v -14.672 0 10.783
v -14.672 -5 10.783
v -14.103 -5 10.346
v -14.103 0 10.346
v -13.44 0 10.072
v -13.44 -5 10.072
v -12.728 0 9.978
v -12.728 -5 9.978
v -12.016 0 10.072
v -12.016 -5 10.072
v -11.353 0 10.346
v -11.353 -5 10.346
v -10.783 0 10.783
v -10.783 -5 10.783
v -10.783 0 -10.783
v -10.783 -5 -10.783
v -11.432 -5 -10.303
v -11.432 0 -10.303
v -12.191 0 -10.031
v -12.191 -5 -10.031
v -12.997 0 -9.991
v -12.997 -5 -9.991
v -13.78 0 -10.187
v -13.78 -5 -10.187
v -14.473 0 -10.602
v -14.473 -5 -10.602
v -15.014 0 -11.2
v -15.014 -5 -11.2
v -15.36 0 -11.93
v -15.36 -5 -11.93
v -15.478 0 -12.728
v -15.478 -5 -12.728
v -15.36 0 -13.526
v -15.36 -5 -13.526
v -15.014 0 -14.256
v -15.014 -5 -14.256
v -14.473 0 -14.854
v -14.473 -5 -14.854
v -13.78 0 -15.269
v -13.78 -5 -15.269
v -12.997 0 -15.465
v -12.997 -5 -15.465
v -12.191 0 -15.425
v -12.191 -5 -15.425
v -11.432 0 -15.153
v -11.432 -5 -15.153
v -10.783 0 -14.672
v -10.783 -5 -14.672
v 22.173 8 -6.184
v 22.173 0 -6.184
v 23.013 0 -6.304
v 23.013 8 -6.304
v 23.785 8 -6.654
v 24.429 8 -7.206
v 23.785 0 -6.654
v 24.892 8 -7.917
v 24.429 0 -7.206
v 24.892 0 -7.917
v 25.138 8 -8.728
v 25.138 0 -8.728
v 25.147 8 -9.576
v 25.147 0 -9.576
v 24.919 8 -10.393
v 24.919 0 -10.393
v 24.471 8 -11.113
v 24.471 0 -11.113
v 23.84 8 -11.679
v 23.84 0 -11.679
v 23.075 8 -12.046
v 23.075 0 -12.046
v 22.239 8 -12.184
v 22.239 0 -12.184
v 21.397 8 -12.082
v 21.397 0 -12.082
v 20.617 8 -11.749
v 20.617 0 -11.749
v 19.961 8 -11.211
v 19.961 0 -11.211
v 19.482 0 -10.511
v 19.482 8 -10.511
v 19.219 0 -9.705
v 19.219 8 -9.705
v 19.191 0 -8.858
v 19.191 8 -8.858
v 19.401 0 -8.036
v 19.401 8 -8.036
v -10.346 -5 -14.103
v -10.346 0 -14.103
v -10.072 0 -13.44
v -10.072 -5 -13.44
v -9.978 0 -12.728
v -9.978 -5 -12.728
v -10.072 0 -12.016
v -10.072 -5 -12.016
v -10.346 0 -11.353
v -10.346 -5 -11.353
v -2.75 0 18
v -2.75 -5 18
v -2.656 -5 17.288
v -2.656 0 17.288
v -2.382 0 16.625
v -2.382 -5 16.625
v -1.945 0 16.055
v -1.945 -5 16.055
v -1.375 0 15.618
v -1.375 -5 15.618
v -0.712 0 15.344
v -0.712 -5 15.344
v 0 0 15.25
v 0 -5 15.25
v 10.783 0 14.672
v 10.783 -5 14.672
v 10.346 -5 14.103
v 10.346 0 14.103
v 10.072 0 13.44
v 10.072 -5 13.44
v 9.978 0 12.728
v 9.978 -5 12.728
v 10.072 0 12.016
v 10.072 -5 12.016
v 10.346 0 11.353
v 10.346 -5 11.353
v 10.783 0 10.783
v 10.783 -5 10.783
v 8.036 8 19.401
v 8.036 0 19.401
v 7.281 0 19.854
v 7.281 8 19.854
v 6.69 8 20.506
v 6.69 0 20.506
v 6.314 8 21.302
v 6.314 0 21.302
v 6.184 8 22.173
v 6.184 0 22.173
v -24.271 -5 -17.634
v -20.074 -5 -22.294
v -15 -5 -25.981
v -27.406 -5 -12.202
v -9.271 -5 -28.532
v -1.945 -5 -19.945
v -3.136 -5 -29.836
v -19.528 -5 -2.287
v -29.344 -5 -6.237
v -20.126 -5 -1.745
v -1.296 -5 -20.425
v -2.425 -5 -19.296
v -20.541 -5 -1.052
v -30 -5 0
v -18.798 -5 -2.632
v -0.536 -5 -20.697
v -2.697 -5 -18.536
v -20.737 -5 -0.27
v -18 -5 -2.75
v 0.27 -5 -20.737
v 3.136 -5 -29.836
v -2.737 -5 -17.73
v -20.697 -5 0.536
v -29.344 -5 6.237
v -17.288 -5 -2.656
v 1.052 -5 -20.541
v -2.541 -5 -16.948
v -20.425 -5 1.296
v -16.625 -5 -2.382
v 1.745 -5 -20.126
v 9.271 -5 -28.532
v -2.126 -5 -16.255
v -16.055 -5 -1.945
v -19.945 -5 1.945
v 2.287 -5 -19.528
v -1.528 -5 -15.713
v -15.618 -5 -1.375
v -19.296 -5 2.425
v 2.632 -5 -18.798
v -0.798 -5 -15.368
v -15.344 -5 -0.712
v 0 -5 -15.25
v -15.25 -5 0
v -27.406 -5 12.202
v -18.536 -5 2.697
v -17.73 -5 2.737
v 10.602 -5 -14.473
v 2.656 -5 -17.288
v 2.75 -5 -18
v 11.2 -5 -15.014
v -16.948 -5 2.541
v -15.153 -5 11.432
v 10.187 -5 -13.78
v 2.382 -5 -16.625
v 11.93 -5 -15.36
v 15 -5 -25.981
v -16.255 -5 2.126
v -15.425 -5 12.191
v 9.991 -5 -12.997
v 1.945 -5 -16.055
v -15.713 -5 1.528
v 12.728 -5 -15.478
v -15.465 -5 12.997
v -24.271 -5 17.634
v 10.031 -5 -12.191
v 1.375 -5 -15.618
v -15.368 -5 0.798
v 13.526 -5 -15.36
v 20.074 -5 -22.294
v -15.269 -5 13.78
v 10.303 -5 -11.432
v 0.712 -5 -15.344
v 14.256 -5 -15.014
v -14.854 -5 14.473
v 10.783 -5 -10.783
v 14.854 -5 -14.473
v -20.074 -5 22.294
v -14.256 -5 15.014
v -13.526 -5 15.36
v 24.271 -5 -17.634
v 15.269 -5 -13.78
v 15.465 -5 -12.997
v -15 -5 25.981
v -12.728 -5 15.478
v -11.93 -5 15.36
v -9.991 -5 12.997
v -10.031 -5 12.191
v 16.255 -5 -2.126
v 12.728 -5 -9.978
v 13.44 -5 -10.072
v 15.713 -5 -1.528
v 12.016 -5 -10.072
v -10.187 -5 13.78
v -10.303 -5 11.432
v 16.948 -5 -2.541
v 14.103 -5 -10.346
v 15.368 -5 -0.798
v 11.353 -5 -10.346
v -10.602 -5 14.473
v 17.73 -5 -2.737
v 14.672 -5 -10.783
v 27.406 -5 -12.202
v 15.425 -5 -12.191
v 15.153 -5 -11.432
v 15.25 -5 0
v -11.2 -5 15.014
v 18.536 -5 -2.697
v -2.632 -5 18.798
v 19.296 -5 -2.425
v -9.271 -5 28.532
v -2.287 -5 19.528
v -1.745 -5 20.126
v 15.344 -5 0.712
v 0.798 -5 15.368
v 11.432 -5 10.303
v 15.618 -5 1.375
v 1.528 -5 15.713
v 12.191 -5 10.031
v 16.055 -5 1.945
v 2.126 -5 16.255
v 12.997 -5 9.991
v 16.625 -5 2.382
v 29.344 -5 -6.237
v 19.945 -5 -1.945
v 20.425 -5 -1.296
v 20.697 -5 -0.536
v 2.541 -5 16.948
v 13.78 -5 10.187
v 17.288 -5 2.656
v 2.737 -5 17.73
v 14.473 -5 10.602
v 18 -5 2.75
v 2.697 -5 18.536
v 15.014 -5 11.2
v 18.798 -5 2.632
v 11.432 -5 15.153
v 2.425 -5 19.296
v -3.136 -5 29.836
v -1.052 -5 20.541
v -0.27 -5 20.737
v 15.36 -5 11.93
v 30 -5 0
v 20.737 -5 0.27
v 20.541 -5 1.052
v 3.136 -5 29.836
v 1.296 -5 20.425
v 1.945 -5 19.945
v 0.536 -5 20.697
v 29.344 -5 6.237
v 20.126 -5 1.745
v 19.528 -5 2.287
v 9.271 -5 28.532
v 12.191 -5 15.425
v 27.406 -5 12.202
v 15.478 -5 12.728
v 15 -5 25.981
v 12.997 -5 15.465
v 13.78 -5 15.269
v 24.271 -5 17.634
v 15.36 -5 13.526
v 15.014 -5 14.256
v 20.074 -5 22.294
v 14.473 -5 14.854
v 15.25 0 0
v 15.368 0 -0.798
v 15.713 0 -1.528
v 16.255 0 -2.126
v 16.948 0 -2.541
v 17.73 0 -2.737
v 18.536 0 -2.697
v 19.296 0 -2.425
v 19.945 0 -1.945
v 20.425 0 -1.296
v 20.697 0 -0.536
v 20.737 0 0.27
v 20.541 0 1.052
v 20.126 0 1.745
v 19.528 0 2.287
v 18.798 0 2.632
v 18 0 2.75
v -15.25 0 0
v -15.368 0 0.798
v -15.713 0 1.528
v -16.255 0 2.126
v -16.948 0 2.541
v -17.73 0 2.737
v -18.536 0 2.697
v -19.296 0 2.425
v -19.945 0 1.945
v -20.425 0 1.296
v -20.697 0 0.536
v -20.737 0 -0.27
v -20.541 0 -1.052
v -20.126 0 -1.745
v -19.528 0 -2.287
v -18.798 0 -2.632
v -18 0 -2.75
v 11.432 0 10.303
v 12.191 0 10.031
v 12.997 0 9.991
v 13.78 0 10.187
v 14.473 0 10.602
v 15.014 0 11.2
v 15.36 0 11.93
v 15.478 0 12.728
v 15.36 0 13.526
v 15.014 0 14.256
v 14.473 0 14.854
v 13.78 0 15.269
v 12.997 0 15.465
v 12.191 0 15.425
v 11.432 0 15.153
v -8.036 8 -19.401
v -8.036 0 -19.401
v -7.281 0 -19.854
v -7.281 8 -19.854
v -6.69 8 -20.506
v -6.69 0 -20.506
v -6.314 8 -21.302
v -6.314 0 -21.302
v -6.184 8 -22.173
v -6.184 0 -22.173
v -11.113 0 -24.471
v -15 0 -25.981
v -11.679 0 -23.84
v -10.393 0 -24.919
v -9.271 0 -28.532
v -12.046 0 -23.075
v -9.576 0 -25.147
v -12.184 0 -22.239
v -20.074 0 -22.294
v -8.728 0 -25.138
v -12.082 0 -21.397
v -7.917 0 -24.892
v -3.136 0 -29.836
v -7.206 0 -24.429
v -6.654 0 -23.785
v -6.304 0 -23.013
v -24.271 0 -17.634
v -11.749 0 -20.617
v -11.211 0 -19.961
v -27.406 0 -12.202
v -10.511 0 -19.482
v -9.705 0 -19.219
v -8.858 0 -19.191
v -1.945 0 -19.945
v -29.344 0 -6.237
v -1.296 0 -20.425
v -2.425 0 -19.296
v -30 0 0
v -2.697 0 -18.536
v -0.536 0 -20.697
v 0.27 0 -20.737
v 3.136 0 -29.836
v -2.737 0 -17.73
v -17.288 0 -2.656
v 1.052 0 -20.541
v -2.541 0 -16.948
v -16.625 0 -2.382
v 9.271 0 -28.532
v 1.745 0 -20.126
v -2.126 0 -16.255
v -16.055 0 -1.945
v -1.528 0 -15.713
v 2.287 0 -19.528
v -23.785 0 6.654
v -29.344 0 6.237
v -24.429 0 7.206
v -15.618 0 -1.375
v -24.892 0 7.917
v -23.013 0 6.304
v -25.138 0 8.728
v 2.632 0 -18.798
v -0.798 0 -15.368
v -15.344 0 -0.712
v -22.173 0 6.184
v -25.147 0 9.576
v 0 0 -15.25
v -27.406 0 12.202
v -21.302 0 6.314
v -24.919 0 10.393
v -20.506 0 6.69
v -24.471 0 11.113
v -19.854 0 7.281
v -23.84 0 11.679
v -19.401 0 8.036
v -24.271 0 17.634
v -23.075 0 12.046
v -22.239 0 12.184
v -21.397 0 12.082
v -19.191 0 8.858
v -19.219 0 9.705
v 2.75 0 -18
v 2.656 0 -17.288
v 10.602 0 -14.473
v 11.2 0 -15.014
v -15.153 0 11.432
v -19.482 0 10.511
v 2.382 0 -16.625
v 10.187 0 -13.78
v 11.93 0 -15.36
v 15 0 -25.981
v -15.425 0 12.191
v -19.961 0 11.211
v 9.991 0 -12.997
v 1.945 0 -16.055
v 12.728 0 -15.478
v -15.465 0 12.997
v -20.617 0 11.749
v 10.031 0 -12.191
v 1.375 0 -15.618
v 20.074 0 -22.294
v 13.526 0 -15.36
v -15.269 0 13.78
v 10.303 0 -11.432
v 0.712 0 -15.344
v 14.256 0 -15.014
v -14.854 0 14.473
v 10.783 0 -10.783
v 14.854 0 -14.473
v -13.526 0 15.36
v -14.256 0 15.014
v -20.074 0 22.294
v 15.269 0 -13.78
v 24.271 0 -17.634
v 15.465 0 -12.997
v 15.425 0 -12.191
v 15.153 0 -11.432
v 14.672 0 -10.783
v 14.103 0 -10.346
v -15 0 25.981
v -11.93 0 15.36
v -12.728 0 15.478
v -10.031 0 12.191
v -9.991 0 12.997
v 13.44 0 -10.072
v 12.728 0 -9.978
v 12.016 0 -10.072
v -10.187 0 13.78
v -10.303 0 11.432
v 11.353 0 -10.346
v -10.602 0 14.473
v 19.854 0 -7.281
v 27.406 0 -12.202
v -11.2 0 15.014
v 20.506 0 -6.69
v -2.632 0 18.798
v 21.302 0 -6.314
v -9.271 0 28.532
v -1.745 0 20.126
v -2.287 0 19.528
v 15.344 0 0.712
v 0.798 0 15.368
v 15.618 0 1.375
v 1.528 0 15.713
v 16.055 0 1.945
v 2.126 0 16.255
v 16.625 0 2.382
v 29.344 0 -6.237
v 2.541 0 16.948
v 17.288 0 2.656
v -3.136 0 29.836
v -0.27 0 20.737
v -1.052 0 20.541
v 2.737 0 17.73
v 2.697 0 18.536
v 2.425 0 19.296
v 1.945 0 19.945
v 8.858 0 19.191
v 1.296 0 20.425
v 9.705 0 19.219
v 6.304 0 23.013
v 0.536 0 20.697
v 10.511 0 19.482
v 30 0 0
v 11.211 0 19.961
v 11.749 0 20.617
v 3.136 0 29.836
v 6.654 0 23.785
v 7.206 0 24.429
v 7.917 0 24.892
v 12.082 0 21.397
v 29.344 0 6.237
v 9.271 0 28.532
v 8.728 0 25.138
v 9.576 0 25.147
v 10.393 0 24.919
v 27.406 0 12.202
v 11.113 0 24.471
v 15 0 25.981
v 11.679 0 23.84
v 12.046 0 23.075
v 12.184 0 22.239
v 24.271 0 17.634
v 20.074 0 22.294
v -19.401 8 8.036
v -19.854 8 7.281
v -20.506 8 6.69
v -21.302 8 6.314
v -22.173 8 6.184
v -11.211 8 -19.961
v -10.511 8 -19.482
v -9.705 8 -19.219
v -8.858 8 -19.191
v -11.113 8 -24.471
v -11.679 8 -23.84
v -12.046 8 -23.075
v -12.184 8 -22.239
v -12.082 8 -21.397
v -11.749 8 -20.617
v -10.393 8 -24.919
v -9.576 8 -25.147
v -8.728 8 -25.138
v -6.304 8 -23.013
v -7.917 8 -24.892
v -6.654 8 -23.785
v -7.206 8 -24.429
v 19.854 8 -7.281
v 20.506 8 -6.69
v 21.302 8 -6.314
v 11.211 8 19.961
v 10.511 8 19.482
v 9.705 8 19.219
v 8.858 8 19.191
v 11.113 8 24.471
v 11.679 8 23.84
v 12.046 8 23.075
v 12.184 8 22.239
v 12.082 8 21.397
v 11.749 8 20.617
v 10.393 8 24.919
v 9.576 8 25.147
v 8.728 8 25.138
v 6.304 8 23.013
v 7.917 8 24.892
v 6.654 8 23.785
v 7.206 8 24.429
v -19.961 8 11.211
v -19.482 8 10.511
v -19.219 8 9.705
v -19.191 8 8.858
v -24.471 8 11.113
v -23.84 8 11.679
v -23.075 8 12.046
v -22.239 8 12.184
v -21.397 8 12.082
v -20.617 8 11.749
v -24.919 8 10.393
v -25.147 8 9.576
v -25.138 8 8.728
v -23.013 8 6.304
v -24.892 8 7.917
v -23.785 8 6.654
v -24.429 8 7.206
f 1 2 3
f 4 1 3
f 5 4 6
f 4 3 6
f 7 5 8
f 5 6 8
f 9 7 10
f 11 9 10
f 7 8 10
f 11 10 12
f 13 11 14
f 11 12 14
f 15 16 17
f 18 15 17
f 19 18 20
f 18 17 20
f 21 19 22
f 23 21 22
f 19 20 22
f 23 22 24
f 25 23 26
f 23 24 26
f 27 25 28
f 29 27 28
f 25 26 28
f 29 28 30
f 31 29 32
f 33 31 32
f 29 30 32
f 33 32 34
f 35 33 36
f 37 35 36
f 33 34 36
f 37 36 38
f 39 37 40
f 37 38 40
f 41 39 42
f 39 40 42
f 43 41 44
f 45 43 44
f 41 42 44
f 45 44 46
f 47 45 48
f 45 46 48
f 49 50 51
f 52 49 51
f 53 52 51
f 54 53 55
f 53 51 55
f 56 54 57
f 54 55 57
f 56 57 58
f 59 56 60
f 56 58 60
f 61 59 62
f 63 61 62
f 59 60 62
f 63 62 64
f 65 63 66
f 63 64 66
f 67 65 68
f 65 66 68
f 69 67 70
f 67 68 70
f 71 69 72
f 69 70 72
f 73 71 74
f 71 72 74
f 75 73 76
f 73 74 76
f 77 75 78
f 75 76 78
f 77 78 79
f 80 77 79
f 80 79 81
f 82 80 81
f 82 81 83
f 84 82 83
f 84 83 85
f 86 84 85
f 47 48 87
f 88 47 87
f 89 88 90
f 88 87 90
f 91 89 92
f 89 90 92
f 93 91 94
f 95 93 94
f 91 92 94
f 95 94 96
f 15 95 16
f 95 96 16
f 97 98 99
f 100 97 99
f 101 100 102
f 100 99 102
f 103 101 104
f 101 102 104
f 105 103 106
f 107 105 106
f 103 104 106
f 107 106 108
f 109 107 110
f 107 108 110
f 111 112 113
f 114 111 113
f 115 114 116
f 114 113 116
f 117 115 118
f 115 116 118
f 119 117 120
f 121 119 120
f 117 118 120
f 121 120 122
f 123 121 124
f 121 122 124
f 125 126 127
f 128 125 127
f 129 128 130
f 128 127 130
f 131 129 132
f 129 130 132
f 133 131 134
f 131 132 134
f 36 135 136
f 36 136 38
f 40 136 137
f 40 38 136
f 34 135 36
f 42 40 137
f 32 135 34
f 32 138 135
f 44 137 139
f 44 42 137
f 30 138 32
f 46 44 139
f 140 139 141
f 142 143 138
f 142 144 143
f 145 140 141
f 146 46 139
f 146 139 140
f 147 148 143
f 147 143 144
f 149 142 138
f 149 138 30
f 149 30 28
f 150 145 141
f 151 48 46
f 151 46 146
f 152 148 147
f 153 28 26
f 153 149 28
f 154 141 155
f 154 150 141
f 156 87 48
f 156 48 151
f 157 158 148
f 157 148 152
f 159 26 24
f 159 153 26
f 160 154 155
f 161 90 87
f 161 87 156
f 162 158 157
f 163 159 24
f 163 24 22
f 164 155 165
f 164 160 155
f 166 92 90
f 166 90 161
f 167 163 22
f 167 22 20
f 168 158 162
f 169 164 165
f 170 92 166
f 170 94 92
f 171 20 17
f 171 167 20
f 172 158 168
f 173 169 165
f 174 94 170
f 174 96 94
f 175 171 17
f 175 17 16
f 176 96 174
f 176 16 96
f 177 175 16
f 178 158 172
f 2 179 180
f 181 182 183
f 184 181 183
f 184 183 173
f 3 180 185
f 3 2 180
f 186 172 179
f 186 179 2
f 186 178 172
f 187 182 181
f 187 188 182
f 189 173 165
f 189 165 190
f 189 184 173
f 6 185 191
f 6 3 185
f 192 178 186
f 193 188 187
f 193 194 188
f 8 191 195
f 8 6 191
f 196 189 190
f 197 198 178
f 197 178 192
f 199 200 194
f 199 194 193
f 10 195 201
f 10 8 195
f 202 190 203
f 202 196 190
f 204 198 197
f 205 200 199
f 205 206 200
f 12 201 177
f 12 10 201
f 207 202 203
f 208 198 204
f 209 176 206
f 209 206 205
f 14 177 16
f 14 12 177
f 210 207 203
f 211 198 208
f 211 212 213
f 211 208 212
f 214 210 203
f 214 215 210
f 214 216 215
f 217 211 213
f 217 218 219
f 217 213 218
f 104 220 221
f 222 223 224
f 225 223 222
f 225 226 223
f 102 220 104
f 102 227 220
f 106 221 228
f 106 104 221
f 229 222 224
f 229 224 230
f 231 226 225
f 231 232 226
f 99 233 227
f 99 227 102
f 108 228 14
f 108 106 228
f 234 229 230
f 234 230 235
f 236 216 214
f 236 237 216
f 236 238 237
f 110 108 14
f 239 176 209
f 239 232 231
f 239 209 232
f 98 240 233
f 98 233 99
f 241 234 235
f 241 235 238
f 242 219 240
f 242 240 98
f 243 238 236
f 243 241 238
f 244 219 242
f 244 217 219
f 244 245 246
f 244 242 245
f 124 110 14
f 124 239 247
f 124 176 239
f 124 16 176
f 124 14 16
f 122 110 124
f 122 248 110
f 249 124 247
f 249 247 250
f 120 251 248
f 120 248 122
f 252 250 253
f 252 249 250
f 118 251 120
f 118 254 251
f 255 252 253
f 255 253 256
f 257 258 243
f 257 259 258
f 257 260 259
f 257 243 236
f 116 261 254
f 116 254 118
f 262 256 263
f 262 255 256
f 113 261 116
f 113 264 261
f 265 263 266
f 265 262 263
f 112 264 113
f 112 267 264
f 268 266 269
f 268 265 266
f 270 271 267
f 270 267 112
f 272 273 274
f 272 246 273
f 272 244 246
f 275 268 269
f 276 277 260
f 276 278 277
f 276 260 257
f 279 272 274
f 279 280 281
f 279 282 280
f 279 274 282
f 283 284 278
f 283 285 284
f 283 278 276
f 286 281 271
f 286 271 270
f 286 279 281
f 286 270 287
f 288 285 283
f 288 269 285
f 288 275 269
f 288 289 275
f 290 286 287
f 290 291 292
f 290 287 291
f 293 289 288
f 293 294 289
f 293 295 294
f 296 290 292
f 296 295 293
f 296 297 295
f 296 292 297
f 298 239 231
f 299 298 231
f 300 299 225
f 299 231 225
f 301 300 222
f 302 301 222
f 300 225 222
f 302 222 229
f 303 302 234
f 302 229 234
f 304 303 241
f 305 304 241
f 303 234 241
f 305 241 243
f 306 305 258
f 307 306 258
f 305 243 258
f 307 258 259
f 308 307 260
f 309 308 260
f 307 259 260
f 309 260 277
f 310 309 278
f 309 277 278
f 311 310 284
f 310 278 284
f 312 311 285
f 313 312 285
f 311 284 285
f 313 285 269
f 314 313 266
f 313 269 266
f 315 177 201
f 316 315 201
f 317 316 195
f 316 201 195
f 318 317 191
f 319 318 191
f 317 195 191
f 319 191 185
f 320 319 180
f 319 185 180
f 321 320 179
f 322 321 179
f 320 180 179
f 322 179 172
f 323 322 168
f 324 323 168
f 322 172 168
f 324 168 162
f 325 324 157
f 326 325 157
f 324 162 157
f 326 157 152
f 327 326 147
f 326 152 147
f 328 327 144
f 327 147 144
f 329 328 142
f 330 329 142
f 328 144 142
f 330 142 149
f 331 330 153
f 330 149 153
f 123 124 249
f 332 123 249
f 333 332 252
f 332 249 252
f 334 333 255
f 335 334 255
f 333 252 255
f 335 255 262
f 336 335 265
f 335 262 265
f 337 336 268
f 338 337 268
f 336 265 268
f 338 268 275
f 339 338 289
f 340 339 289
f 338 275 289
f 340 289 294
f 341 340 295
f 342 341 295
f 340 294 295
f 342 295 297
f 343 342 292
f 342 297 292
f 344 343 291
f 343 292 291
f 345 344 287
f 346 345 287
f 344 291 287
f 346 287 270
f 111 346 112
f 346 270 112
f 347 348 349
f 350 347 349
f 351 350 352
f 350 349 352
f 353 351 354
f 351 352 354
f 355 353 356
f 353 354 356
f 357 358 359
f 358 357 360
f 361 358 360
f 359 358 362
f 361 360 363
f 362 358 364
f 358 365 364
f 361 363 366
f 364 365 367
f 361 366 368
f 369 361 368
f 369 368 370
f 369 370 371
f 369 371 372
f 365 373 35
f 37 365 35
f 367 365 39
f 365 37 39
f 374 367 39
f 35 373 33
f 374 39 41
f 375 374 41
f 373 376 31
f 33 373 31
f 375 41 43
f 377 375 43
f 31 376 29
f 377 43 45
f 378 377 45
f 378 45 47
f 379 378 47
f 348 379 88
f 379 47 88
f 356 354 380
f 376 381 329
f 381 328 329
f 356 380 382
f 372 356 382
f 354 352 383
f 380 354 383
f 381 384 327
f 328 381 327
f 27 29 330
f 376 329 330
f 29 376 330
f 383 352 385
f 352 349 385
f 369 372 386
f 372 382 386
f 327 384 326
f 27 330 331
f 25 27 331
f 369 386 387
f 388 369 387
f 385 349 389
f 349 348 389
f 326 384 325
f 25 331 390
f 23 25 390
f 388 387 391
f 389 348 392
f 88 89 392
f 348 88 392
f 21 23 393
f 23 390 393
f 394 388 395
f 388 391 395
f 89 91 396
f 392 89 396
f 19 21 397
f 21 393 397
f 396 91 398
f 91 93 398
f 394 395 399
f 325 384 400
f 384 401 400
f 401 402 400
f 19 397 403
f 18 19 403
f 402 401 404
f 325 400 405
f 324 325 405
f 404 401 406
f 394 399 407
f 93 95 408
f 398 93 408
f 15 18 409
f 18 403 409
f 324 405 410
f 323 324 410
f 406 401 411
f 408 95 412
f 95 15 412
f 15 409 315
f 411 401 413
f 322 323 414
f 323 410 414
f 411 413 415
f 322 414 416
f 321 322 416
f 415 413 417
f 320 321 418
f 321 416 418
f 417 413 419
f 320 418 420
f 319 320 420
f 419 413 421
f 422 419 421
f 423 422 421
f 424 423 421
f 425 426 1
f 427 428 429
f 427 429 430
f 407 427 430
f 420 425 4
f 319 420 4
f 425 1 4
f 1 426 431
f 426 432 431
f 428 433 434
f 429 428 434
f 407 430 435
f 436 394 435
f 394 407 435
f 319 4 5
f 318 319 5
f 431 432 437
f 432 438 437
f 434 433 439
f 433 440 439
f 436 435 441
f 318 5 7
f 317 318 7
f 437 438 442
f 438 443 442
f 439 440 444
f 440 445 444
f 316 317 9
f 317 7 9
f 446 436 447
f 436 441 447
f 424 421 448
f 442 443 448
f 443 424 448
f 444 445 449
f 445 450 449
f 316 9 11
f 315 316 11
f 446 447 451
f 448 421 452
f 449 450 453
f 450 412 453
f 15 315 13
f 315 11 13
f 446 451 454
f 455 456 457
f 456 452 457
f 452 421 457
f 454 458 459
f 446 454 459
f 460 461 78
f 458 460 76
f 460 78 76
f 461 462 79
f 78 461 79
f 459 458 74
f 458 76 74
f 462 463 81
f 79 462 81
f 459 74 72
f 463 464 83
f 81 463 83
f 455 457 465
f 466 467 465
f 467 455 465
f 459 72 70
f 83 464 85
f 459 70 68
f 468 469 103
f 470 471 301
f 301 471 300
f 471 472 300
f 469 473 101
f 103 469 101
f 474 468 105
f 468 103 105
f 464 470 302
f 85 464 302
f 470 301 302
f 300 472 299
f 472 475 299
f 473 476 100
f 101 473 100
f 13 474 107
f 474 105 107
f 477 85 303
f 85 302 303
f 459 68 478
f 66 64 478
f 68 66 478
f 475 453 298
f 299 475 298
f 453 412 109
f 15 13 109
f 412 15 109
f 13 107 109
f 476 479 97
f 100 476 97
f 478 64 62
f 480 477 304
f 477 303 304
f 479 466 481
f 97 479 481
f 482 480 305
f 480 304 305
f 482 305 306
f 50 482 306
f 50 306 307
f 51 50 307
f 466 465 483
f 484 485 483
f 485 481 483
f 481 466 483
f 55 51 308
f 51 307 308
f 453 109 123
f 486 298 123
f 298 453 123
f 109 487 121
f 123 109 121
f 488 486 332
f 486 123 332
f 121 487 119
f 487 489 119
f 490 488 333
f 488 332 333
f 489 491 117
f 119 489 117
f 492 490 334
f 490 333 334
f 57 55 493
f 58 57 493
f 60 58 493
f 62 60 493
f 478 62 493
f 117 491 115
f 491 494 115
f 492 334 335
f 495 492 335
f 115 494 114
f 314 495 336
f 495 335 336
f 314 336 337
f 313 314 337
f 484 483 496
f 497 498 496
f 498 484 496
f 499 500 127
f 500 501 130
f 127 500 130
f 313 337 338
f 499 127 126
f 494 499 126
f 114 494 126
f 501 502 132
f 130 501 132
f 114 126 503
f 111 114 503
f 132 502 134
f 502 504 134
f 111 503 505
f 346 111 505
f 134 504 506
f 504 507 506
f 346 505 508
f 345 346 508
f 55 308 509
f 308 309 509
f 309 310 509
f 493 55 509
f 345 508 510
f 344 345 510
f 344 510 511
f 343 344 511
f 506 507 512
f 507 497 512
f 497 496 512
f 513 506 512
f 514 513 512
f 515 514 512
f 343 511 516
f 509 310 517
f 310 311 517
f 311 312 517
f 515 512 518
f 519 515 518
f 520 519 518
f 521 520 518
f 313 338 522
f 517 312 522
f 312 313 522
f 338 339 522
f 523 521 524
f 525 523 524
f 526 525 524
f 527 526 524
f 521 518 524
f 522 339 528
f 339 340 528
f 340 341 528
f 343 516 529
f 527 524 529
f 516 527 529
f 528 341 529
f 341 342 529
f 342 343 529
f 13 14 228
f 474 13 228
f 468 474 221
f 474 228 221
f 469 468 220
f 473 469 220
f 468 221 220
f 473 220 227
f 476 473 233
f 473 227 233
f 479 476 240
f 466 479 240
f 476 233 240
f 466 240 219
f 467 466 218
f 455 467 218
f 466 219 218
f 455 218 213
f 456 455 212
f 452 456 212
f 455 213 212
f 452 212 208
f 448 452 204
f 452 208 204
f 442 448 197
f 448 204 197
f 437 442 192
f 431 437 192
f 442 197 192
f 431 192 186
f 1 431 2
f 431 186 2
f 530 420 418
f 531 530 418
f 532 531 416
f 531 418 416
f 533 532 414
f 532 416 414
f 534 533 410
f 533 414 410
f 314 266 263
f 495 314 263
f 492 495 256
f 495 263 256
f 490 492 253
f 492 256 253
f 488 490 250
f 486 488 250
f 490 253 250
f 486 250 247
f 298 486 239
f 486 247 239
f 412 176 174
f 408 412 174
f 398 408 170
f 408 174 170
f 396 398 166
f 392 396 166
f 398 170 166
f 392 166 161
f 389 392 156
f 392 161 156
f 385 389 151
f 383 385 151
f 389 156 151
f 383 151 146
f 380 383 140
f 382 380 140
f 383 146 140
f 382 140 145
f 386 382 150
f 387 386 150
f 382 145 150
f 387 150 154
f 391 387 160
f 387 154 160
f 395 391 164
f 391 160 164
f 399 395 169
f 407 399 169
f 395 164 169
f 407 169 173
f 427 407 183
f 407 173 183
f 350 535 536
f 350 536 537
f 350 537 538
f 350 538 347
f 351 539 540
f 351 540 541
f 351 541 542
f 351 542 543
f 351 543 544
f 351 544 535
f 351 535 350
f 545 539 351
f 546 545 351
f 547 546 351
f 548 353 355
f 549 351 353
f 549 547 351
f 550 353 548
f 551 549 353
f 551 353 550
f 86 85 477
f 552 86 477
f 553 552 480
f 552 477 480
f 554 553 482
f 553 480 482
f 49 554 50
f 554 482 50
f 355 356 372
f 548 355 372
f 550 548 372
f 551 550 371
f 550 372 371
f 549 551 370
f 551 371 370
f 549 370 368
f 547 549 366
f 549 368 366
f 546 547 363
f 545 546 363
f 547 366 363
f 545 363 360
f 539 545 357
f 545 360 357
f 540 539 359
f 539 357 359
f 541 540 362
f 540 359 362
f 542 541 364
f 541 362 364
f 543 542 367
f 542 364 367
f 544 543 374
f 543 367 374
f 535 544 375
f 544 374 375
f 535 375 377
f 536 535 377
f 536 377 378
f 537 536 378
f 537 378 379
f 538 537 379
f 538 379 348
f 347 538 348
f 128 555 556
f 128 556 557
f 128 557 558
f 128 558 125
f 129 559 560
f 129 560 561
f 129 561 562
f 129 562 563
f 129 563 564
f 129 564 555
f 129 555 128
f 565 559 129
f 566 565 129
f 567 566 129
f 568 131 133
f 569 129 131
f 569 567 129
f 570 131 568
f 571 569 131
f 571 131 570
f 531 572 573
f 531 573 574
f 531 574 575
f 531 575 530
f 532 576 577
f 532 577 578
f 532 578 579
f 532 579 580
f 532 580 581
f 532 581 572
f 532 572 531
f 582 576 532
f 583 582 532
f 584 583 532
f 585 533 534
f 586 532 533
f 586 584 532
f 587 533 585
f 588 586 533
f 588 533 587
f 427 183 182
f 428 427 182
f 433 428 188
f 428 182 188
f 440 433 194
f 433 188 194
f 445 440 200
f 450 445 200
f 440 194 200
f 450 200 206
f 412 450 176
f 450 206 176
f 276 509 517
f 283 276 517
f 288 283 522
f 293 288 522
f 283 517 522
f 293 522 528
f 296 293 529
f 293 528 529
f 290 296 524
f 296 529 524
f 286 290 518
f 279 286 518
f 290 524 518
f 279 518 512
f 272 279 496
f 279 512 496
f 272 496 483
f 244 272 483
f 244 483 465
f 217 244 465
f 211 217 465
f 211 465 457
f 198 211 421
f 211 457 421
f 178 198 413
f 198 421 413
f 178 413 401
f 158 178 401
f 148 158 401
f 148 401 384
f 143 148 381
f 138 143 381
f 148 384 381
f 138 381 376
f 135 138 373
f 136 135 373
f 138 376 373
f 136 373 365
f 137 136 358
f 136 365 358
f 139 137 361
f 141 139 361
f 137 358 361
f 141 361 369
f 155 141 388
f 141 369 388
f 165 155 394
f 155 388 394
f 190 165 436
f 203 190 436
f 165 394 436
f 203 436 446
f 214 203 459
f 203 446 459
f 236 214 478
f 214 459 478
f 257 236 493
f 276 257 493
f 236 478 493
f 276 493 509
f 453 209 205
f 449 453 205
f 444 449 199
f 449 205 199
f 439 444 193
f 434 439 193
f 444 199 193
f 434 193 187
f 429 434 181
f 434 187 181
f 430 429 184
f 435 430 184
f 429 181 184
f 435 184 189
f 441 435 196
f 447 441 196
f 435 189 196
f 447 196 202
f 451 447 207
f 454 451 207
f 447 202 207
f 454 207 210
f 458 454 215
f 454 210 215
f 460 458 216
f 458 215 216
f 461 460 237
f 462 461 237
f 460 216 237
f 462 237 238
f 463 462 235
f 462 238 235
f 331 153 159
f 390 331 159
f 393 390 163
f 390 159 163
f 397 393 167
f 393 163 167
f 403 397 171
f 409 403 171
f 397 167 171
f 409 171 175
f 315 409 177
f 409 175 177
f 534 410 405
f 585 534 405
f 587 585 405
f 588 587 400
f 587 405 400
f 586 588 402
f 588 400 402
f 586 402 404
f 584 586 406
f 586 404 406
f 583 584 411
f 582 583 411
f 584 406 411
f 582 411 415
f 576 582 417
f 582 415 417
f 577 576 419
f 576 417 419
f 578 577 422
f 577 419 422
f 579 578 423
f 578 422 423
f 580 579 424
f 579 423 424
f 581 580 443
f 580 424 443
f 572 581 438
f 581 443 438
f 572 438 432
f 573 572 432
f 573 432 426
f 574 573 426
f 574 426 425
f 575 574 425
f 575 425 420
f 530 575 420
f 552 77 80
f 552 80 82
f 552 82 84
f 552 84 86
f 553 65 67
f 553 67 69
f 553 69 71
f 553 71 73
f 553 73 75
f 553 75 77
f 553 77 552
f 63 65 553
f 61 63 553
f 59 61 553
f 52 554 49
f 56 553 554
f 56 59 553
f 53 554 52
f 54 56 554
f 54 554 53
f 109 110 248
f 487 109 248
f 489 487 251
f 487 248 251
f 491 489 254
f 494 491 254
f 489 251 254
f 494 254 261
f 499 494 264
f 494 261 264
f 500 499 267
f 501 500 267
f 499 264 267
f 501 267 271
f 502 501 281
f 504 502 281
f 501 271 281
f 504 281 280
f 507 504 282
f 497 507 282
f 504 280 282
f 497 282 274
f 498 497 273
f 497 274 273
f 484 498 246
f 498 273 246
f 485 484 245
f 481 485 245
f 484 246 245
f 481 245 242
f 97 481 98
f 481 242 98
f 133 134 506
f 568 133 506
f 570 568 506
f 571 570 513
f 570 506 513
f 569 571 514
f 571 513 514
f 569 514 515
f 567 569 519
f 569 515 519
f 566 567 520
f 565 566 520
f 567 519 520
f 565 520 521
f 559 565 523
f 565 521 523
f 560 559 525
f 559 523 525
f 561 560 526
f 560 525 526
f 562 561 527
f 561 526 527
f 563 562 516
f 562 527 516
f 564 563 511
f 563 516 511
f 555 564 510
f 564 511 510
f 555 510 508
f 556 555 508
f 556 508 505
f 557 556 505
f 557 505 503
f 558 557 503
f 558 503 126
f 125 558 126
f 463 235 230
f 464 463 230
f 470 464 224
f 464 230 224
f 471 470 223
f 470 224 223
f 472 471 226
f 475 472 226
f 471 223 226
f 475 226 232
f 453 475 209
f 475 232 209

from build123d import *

# Parameters (mm, degrees)
F0_R            = 30
F1_DEPTH        = 5
F3_DEPTH        = 25
F3_COPIES_COUNT = 8
F5_DEPTH        = 8
F5_COPIES_COUNT = 4


# Not quite as in the source:
# - a pattern or mirror of a feature is missing from the dataset's text; its kind, count and spacing are read off the source's solid
# - a feature names something its author has since deleted; it is built from what else it names


with BuildPart() as f1:
    # F0 (on Front) → F1 (new body)
    with BuildSketch(Plane.XZ):
        Circle(F0_R)
    extrude(amount=F1_DEPTH)

    # F2 (on face) → F3 (cut)
    with BuildSketch(Plane.XZ.offset(5)):
        with BuildLine():
            ThreePointArc((0, -15.25), (-1.9445436483, -19.9445436483), (2.75, -18))
            ThreePointArc((2.75, -18), (1.9445436483, -16.0554563517), (0, -15.25))
        make_face()
    f3 = extrude(amount=-F3_DEPTH, mode=Mode.SUBTRACT)

    # F3_copies: F3 ×8 about axis
    f3_copies_axis = Axis((0, 0, 0), (0, 1, 0))
    for i in range(1, F3_COPIES_COUNT):
        add(f3.rotate(f3_copies_axis, i * 360 / F3_COPIES_COUNT), mode=Mode.SUBTRACT)

    # F4 (on face) → F5 (join)
    with BuildSketch(Plane(origin=(0, 0, 0), x_dir=(-1, 0, 0), z_dir=(0, 1, 0))):
        with BuildLine():
            ThreePointArc((-8.0363520797, 19.4014701827), (-6.6899935399, 20.5063980812), (-6.1844023768, 22.1731087803))
            ThreePointArc((-6.1844023768, 22.1731087803), (-11.6788112137, 23.8398194793), (-8.0363520797, 19.4014701827))
        make_face()
    f5 = extrude(amount=F5_DEPTH)

    # F5_copies: F5 ×4 about axis
    f5_copies_axis = Axis((0, 0, 0), (0, 1, 0))
    for i in range(1, F5_COPIES_COUNT):
        add(f5.rotate(f5_copies_axis, i * 360 / F5_COPIES_COUNT))


solid = f1.part
